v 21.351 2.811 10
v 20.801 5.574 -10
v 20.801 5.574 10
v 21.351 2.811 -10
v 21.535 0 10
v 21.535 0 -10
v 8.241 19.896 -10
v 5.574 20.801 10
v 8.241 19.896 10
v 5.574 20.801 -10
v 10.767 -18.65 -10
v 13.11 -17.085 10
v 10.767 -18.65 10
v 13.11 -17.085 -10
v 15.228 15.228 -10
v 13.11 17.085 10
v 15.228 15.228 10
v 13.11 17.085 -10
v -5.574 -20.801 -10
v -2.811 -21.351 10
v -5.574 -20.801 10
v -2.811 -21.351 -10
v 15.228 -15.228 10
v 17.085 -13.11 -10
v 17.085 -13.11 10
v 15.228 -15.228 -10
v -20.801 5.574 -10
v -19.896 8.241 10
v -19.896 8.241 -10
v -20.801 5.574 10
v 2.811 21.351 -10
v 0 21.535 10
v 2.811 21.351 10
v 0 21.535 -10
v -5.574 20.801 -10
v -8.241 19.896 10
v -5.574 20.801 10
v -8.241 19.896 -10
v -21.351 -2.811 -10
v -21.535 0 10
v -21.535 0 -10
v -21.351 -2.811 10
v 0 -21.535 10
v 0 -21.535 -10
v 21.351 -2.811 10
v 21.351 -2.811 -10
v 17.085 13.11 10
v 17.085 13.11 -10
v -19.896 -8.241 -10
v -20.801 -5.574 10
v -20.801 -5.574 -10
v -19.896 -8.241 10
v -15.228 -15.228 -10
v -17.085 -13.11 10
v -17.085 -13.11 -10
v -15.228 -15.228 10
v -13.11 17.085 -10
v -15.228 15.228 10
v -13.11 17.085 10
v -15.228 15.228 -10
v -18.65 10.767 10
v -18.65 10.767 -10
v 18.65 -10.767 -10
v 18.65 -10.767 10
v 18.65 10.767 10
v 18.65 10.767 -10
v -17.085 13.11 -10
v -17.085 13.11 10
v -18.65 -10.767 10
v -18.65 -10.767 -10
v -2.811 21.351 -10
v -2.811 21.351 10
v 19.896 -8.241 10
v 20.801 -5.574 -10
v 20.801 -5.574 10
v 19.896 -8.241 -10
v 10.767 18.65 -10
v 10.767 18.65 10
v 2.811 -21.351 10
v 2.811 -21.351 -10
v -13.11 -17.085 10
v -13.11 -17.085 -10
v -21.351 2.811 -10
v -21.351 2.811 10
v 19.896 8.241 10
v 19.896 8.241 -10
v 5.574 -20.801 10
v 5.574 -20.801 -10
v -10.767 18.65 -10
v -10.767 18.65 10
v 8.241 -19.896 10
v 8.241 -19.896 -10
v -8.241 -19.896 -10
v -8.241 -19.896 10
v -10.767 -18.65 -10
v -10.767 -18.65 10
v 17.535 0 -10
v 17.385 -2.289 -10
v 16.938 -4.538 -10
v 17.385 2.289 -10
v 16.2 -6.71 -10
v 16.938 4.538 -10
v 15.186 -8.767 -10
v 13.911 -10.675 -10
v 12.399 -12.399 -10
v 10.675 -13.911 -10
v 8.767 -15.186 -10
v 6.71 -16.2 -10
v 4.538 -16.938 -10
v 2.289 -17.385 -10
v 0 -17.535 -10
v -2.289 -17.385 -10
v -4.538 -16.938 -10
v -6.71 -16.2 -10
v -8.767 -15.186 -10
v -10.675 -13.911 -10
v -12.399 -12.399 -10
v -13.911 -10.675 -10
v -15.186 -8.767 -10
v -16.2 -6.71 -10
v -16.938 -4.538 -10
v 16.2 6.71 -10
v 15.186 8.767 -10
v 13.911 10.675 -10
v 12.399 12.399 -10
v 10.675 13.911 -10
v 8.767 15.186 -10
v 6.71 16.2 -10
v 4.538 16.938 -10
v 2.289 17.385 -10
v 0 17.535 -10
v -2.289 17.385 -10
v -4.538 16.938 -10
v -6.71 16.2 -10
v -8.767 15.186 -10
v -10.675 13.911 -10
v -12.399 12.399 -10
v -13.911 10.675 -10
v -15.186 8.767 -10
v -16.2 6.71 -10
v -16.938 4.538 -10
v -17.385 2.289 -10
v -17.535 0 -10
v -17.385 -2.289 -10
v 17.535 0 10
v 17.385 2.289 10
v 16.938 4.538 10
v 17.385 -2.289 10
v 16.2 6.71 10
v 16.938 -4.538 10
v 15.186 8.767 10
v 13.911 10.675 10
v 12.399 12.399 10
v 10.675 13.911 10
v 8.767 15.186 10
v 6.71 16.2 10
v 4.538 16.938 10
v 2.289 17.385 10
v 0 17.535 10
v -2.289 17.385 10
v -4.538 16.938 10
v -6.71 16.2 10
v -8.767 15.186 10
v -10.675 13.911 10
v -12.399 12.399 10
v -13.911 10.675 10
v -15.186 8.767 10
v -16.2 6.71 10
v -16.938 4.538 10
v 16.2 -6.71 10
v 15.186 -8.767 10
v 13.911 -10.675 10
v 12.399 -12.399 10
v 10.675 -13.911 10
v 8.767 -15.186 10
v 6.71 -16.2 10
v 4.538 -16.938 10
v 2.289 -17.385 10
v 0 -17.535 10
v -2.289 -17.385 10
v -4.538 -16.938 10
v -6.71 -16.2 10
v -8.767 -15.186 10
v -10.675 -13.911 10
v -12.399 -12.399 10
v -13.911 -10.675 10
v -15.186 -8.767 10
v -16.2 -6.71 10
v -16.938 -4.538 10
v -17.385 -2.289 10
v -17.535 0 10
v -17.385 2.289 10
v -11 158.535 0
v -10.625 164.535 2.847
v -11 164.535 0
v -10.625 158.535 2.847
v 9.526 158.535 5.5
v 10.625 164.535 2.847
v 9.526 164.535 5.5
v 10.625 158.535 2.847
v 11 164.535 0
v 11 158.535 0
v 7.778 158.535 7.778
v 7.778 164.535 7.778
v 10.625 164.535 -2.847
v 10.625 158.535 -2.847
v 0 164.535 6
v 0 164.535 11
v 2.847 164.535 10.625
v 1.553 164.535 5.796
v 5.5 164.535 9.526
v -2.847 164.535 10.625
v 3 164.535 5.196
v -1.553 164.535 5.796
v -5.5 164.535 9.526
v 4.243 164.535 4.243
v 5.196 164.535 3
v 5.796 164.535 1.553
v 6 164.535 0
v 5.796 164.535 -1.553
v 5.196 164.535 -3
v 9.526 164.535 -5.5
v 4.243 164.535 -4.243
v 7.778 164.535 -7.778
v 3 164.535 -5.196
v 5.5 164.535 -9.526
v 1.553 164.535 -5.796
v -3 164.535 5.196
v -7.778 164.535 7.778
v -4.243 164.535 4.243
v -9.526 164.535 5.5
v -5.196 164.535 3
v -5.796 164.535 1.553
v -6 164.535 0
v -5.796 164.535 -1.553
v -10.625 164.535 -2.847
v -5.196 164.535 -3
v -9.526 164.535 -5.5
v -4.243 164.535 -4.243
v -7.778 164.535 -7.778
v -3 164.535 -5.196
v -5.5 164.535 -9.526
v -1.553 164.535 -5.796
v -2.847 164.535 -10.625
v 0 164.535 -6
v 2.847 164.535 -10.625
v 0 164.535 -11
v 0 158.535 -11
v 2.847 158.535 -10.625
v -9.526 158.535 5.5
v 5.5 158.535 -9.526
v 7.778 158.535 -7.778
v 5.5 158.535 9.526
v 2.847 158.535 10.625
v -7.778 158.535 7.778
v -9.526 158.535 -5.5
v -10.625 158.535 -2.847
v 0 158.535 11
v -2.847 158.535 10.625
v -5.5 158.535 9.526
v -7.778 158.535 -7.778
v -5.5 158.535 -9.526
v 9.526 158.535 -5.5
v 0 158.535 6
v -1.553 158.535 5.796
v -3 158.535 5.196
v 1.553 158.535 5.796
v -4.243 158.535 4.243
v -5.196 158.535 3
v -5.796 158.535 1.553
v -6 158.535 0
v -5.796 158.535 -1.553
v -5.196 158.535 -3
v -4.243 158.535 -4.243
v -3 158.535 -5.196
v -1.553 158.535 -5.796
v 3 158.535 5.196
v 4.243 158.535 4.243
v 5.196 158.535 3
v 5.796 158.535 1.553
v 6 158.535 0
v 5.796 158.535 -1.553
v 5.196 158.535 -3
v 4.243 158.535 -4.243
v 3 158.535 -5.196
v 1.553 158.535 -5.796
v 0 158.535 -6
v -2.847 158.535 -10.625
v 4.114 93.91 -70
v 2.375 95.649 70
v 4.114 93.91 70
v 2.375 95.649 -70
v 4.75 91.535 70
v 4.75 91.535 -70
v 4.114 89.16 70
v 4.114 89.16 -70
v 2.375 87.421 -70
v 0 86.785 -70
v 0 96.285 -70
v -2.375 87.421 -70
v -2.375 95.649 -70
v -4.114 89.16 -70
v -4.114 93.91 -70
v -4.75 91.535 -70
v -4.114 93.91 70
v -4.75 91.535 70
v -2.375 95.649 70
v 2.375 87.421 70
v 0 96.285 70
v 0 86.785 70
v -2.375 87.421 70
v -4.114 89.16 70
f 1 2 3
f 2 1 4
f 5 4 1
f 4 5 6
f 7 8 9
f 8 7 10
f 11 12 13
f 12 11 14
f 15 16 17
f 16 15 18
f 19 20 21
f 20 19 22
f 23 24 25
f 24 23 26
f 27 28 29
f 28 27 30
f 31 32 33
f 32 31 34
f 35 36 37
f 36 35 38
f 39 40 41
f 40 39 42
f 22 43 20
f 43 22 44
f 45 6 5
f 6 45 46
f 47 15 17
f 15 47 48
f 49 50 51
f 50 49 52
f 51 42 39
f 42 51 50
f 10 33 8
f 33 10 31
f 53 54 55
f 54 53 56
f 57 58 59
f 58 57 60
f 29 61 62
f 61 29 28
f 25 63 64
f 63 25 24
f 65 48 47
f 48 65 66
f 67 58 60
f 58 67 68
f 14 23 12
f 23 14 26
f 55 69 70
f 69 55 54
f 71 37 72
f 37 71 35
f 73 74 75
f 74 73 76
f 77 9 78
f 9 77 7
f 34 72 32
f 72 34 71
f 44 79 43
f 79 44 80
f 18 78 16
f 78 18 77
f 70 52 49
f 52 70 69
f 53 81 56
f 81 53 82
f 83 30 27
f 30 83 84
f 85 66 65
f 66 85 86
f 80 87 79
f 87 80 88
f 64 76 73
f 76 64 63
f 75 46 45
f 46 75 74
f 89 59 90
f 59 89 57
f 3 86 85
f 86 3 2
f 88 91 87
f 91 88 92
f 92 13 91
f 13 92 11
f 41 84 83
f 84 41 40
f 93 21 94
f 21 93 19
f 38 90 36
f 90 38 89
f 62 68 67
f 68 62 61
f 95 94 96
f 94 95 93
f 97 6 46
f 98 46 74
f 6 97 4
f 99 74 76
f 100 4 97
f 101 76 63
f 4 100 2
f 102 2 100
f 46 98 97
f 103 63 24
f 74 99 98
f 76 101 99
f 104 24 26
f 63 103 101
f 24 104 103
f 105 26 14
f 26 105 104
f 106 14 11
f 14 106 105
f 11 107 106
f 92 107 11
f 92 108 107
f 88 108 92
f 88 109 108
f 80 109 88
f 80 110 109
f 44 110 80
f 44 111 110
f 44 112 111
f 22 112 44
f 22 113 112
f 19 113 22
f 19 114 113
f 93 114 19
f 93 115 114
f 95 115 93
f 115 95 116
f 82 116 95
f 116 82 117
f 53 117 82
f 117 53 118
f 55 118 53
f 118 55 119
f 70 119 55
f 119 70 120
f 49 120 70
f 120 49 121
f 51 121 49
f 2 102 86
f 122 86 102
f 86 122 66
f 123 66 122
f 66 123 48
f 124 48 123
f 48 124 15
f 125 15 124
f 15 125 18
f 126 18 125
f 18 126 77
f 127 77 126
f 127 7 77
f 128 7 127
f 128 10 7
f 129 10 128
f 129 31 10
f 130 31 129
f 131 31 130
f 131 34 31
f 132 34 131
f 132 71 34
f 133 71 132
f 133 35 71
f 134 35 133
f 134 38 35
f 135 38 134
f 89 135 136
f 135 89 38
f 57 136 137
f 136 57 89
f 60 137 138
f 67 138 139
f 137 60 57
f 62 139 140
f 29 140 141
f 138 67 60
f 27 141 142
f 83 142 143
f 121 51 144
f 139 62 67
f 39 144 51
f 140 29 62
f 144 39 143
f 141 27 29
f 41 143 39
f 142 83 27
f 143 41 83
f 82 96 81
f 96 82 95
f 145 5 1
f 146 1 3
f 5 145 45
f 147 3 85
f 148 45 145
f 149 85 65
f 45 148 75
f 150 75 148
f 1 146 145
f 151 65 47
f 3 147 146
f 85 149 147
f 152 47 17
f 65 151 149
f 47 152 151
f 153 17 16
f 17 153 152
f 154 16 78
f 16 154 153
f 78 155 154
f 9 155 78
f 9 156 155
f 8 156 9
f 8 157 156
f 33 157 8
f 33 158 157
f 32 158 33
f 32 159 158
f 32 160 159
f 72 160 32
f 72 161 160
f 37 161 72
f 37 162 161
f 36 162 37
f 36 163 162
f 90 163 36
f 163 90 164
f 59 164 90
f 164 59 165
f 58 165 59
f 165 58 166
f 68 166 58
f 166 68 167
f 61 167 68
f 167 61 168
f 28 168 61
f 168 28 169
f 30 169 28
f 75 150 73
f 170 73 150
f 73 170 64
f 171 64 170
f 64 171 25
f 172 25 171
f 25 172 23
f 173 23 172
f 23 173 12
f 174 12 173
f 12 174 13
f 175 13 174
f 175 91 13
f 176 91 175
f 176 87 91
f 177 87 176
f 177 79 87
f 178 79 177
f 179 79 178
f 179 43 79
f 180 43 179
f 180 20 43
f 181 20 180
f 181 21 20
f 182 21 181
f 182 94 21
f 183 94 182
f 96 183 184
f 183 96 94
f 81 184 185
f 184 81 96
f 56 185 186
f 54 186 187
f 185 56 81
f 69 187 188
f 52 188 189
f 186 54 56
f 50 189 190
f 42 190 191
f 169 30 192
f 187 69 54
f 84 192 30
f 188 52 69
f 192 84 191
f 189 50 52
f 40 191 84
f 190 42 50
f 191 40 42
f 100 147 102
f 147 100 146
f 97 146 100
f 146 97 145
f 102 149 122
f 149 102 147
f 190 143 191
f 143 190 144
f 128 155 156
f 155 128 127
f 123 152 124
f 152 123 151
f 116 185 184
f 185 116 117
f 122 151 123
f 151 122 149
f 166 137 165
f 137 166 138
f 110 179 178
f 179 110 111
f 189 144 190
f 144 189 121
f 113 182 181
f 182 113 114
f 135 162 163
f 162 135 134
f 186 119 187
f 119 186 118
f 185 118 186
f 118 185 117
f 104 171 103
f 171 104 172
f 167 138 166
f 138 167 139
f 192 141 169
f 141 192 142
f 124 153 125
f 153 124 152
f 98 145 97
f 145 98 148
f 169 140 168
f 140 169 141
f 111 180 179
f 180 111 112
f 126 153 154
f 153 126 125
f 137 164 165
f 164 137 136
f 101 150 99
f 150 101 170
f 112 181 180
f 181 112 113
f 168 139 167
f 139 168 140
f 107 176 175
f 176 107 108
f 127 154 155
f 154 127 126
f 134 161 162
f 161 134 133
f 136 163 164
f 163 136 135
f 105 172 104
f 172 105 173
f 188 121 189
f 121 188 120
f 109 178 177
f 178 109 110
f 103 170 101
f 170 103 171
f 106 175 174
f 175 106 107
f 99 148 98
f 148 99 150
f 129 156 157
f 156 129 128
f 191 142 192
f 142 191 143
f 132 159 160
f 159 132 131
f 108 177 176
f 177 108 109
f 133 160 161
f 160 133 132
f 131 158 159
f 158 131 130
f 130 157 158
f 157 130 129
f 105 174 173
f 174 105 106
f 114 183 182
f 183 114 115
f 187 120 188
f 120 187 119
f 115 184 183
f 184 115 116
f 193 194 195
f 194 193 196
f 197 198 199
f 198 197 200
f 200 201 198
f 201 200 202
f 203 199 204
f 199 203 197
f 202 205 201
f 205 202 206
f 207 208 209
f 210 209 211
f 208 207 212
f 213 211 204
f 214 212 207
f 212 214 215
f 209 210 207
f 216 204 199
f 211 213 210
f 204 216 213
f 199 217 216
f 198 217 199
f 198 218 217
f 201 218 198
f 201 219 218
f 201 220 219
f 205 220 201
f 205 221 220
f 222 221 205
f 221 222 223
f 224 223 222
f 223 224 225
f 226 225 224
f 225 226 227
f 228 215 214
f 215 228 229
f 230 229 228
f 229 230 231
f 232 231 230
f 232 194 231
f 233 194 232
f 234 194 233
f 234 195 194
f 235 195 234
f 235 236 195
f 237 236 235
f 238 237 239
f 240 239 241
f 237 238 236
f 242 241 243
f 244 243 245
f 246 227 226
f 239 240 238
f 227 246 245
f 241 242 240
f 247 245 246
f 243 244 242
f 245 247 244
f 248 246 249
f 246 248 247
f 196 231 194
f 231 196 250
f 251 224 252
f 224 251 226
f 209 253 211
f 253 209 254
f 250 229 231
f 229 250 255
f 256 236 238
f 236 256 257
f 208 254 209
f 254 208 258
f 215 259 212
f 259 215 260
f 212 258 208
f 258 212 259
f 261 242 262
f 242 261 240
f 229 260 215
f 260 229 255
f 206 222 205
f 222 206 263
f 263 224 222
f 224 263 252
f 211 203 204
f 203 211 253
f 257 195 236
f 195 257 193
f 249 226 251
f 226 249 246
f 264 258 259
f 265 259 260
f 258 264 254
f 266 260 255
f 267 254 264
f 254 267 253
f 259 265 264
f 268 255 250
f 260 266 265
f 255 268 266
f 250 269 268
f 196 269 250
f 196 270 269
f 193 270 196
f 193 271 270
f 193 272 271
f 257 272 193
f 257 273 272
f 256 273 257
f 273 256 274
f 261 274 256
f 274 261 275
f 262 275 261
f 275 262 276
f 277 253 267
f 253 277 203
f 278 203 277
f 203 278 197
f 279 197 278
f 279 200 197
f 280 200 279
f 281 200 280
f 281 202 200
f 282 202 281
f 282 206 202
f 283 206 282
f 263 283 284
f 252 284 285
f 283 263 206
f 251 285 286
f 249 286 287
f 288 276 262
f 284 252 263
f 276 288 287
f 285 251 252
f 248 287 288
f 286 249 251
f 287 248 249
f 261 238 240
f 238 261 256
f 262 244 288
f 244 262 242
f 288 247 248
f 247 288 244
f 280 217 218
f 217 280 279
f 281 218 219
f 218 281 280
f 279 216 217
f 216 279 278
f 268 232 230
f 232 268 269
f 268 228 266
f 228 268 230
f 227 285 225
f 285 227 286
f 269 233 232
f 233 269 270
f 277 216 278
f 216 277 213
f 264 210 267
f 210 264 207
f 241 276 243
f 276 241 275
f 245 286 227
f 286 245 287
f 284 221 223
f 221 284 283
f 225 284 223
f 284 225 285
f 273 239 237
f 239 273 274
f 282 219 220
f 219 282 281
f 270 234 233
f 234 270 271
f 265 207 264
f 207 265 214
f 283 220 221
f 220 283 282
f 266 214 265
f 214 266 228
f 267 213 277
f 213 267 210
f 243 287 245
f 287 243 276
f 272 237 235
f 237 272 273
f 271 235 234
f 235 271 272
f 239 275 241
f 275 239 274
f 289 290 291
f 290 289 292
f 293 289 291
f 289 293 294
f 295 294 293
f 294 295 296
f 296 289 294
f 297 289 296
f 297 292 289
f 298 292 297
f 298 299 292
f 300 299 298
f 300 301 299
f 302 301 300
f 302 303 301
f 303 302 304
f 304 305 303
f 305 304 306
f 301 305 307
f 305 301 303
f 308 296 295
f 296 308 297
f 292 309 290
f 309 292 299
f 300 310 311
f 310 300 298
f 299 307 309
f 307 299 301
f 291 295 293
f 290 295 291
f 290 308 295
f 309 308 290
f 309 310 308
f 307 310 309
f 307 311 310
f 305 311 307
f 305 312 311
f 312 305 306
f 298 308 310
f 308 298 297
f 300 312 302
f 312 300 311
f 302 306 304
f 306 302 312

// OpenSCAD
// Auto-generated by scripts/author_from_manifest.py (Phase D.3).
// Source: data/phase_d_manifest.json (sku_intent='tolco-fig4-swivel-ring-1in').
// Do not hand-edit — regenerate from the manifest.
//
// @part tolco_fig4_swivel_ring_1in
// @kind hanger
// @category hanger.swivel.ring
// @display-name "Tolco FIG 4 Adjustable Swivel Ring Hanger 1\""
// @mfg nvent_tolco
// @mfg-pn FIG_4_1in
// @listing UL
// @price-usd 4.30
// @install-minutes 4
// @crew journeyman
// @param size_in number default=1 label="Size" unit="in"
// @port pipe position=[0,0,0] direction=[0,1,0] style=grooved size_in=1 role=run_a

size_in = 1.0;

function od_mm(nps) =
    nps ==   1  ? 33.4 :
    nps == 1.25 ? 42.2 :
    nps == 1.5  ? 48.3 :
    nps ==   2  ? 60.3 :
    nps == 2.5  ? 73.0 :
    nps ==   3  ? 88.9 :
    nps ==   4  ? 114.3 :
    nps ==   6  ? 168.3 :
    nps ==   8  ? 219.1 : 60.3;

od = od_mm(size_in);
ring_id = od * 1.05;
ring_od = ring_id + 8;
strap_w = 20;
rod_len = 140;

union() {
    // Ring
    difference() {
        cylinder(h = strap_w, d = ring_od, center = true, $fn = 48);
        cylinder(h = strap_w + 1, d = ring_id, center = true, $fn = 48);
    }
    // Rod up +Y
    translate([0, rod_len/2 + ring_od/2, 0])
        cylinder(h = rod_len, d = 9.5, center = true, $fn = 12);
    // Top swivel eye
    translate([0, rod_len + ring_od/2, 0])
        rotate([90, 0, 0])
        difference() {
            cylinder(h = 6, d = 22, center = true, $fn = 24);
            cylinder(h = 8, d = 12, center = true, $fn = 24);
        }
}
